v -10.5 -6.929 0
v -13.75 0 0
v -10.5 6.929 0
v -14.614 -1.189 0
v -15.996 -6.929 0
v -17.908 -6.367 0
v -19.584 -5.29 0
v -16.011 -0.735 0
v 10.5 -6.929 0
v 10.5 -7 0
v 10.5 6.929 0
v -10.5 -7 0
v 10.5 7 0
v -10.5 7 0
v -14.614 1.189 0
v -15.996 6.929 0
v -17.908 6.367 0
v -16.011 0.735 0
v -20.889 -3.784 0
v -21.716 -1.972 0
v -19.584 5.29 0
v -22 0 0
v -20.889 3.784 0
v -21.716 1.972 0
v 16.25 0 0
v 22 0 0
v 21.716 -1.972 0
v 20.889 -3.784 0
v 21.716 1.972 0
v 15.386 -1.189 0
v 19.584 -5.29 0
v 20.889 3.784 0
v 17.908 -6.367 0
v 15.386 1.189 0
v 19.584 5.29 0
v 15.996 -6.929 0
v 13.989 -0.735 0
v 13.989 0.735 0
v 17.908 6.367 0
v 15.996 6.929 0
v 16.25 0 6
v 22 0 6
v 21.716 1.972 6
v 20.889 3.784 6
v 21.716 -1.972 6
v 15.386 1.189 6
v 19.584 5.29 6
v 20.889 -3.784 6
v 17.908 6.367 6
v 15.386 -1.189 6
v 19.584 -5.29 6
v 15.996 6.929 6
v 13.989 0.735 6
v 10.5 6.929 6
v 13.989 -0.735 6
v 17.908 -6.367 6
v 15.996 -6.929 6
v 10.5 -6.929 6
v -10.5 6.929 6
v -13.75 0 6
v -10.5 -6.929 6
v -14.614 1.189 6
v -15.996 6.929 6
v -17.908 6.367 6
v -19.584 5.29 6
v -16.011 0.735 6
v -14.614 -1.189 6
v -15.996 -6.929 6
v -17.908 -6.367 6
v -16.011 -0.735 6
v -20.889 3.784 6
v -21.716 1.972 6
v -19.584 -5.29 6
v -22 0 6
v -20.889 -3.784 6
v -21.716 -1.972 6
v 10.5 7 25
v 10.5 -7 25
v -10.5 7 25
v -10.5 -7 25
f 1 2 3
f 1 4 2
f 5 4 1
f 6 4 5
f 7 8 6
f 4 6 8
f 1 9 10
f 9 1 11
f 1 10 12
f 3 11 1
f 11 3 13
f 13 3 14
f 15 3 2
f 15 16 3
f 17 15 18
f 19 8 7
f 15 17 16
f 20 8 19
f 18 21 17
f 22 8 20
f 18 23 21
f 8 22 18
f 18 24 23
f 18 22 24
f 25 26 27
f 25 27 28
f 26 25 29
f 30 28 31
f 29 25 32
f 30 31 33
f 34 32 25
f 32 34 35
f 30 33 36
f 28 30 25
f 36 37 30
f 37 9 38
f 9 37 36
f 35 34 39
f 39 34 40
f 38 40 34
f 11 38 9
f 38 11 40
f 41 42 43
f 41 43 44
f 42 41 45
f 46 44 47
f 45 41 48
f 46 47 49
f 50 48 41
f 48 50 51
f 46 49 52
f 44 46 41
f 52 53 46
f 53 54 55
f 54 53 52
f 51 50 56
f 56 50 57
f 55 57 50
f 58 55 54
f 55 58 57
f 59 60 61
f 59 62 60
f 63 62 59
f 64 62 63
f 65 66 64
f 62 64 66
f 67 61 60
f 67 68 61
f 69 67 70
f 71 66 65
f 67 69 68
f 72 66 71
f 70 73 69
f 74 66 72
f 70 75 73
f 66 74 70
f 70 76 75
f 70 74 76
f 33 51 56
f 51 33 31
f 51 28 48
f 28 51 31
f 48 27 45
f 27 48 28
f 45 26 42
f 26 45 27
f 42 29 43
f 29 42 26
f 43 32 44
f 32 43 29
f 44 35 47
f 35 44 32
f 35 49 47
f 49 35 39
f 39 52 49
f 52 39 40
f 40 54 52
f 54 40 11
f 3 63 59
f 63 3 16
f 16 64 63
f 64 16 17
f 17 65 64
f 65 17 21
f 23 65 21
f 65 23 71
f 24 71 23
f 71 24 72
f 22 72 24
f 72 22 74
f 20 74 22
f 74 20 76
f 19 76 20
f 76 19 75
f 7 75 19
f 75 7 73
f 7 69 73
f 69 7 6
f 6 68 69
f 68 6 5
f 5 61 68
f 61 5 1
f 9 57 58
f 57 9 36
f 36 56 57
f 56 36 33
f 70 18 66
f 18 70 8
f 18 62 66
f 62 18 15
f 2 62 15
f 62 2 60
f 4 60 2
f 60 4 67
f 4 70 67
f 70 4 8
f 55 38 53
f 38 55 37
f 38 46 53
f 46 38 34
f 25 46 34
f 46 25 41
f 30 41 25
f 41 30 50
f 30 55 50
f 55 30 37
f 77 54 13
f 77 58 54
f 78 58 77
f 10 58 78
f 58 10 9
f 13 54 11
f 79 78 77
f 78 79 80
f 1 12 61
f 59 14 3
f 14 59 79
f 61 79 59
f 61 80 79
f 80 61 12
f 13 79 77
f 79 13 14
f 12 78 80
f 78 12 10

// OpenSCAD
//distance trous 30 mm
//vis M3, tap 2.5, clearance 3.4


module usb_connector() {
    height= 14;
    linear_extrude(6) difference() {
        hull() {
            translate([-15,0]) circle(d=height);
            translate([15,0]) circle(d=height);
        }
        {
            translate([-15,0]) circle(d=2.5);
            translate([15,0]) circle(d=2.5);
        }
    }
    translate([0,0,25/2]) cube([21,height,25],center=true);
}

usb_connector();
